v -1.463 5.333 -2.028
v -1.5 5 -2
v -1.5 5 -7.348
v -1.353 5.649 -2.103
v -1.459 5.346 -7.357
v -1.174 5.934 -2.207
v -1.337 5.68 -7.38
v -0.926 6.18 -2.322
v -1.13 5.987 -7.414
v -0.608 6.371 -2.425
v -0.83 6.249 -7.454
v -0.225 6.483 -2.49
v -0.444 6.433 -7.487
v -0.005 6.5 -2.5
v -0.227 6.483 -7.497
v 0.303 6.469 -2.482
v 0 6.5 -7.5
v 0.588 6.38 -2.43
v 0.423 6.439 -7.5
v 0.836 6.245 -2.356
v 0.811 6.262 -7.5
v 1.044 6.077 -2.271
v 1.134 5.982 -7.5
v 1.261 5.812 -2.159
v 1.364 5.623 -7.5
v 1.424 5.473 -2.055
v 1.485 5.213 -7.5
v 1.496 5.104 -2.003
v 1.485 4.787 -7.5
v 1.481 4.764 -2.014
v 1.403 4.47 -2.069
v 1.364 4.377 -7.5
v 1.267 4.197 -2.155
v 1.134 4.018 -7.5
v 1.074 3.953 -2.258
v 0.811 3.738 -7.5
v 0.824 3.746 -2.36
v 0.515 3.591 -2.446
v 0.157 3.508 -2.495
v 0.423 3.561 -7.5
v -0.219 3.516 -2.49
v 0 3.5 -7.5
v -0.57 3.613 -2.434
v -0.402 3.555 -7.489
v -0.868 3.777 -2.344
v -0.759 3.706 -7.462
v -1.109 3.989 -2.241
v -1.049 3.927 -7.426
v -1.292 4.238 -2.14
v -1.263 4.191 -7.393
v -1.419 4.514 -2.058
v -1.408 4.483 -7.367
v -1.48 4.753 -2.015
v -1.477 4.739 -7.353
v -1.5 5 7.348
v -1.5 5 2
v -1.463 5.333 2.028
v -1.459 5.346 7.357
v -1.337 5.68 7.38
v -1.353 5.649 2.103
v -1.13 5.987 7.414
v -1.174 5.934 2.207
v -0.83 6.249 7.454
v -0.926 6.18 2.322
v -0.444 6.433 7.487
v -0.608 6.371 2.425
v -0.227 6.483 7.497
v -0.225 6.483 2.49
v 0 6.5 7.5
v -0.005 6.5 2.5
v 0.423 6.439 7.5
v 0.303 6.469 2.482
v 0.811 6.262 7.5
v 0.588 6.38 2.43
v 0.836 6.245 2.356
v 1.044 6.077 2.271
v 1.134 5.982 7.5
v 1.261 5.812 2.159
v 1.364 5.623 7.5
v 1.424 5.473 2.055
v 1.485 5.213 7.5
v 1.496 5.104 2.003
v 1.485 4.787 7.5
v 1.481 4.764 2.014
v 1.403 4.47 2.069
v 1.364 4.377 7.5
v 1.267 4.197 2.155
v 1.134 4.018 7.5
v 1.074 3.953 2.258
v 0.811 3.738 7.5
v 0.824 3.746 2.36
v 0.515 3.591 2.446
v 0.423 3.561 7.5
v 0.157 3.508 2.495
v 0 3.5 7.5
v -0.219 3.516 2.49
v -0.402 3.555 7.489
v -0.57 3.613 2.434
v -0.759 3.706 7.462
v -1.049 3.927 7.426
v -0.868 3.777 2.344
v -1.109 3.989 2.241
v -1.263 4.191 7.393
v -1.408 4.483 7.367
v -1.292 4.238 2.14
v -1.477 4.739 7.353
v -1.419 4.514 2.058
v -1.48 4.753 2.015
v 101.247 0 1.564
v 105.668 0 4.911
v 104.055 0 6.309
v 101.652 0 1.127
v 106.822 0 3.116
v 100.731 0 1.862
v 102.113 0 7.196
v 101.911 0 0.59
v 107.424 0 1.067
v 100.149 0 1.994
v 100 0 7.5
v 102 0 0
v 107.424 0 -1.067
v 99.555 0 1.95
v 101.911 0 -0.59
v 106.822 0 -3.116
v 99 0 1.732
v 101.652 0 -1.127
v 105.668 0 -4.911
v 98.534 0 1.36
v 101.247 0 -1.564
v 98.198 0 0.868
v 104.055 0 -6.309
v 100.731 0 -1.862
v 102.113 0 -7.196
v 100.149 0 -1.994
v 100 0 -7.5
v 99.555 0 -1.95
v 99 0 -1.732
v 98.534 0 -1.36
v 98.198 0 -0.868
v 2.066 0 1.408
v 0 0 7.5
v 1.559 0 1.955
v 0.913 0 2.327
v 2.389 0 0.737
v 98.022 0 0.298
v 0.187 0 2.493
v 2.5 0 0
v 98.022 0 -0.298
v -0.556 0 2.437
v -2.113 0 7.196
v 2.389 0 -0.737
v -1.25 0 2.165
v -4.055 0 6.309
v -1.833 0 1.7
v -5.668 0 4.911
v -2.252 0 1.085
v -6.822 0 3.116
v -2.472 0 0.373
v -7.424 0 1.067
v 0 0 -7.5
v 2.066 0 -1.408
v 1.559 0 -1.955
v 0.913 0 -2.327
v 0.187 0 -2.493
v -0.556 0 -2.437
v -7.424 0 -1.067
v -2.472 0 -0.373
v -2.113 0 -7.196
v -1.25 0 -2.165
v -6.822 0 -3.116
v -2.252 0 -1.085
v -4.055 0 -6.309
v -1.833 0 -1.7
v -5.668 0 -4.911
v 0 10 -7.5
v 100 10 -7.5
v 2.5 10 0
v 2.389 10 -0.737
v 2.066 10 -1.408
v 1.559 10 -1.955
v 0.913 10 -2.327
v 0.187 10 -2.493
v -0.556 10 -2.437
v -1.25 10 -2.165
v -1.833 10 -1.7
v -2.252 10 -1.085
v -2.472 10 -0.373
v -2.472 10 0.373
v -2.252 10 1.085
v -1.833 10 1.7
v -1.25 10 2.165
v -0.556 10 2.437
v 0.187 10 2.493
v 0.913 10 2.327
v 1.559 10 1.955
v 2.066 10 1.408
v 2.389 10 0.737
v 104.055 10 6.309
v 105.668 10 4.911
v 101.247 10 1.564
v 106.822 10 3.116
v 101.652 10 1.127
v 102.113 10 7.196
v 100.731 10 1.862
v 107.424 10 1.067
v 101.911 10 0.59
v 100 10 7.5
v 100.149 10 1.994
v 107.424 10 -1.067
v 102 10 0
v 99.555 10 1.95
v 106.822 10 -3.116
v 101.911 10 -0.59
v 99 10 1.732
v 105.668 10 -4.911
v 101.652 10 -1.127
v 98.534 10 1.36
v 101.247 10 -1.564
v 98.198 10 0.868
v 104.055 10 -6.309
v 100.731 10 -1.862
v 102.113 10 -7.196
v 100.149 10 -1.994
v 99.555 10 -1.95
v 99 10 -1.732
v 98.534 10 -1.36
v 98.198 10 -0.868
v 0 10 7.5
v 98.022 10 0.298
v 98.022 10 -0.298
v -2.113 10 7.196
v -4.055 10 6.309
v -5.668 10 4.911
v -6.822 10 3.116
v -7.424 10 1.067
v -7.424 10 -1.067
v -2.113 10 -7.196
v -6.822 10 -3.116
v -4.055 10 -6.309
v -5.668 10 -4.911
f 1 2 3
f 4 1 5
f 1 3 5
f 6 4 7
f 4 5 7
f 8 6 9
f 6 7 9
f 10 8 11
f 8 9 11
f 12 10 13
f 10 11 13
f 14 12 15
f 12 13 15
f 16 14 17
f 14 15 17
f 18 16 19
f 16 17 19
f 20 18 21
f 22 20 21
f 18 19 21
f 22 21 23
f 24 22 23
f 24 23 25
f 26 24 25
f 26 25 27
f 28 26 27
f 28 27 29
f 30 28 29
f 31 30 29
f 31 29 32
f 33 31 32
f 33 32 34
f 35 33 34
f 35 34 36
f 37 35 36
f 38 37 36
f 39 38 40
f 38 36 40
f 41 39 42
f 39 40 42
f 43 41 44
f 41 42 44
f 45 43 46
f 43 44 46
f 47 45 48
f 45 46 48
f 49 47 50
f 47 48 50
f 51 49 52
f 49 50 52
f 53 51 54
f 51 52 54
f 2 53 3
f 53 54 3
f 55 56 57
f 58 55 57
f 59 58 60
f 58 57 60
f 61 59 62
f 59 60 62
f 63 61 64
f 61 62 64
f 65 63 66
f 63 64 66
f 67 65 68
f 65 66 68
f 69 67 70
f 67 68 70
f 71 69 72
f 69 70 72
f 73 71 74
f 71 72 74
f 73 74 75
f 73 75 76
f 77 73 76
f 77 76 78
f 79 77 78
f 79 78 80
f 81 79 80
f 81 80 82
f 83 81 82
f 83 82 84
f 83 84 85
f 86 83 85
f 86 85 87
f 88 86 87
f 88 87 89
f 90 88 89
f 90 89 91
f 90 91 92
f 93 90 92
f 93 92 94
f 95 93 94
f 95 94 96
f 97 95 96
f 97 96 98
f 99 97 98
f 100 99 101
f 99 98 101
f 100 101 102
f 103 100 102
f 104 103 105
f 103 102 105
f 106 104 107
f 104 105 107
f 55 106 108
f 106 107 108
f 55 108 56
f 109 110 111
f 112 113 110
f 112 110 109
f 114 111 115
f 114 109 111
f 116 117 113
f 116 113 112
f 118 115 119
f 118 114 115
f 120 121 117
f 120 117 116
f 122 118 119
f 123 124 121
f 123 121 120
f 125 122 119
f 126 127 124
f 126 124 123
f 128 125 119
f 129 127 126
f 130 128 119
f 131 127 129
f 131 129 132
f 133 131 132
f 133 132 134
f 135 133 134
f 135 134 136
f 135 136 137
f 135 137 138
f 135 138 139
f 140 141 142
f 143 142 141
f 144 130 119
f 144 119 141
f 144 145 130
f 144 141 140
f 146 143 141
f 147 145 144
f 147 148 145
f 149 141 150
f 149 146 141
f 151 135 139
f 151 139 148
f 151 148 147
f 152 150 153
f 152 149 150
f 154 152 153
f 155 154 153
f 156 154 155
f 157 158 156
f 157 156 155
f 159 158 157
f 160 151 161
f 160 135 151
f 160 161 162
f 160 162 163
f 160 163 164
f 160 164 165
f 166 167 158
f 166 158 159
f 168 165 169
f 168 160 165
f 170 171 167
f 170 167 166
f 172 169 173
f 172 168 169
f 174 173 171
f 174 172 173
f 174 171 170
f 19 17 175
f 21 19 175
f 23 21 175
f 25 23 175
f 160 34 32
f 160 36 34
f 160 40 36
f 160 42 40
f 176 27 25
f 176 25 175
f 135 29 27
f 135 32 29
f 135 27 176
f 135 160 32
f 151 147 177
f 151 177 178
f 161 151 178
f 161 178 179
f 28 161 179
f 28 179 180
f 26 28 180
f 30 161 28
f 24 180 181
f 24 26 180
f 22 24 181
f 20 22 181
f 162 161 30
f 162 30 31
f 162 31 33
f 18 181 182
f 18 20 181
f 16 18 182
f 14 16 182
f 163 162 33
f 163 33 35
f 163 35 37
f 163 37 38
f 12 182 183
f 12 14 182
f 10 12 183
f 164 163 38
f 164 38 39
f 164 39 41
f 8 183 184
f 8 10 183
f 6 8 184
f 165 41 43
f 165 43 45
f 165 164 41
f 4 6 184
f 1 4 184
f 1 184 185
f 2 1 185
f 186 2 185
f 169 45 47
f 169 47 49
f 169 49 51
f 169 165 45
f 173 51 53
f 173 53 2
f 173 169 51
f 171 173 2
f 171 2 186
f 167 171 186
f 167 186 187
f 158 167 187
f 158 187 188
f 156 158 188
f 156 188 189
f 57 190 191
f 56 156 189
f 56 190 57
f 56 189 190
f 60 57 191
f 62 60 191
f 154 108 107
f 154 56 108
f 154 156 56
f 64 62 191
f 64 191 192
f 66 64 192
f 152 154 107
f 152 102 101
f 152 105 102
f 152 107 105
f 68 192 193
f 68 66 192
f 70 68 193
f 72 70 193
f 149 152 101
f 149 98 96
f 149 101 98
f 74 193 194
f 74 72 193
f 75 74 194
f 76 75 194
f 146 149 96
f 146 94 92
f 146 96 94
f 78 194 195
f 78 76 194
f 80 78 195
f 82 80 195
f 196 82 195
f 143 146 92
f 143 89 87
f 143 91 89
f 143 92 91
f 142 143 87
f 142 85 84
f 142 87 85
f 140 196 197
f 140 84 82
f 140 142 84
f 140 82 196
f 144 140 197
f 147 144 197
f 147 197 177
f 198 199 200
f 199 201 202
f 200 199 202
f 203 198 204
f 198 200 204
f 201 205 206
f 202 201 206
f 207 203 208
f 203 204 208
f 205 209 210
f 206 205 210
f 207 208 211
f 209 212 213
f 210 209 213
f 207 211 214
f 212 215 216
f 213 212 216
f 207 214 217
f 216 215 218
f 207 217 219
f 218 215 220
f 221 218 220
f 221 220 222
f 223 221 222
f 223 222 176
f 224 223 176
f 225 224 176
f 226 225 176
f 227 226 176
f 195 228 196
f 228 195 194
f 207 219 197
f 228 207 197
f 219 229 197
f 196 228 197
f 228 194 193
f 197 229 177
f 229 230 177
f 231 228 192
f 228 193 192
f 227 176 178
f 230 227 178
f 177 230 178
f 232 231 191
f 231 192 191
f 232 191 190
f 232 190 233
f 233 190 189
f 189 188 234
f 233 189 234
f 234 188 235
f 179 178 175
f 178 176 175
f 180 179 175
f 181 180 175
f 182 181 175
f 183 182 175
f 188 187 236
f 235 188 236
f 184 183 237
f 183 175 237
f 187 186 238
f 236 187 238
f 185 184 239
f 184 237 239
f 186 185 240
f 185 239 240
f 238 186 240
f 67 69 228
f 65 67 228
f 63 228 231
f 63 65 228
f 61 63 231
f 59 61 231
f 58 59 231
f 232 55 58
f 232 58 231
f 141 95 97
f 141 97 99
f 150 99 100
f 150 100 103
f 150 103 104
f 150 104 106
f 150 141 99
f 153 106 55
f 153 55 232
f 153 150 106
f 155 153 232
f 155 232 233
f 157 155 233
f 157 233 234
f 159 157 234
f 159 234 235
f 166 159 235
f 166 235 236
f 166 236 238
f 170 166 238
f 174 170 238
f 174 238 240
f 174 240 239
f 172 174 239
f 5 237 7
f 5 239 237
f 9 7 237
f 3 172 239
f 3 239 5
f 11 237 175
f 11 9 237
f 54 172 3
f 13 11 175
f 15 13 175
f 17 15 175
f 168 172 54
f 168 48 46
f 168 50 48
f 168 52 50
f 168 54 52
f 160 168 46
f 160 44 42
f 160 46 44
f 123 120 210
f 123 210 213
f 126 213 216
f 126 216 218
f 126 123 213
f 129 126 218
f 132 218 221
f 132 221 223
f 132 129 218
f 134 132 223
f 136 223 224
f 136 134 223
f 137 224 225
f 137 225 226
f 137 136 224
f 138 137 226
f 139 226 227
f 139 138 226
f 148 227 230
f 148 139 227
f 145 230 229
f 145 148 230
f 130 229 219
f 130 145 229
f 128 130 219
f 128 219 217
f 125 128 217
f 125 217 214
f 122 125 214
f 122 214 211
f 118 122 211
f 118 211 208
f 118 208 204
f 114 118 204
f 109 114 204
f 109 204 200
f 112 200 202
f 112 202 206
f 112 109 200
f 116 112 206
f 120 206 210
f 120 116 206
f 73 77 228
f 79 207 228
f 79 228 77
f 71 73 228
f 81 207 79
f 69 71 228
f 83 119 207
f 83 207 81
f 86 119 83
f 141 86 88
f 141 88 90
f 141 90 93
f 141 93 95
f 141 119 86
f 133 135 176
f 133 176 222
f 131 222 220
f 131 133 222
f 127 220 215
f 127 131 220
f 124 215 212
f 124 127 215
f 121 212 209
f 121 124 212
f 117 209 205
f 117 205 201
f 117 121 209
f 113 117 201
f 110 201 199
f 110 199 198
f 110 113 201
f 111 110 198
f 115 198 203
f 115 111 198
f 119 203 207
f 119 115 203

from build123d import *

# Parameters (mm, degrees)
SKETCH2_R           = 2.5
SKETCH2_R_2         = 2
BOSS_EXTRUDE1_DEPTH = 10
SKETCH4_R           = 1.5
CUT_EXTRUDE3_DEPTH  = 16


with BuildPart() as part:
    # Sketch2 → Boss-Extrude1 (new body)
    with BuildSketch(Plane(origin=(0, 0, 0), x_dir=(1, 0, 0), z_dir=(0, 1, 0))):
        with BuildLine():
            Line((0, 7.5), (100, 7.5))
            ThreePointArc((100, 7.5), (107.5, 0), (100, -7.5))
            Line((100, -7.5), (0, -7.5))
            ThreePointArc((0, -7.5), (-7.5, 0), (0, 7.5))
        make_face()
        Circle(SKETCH2_R, mode=Mode.SUBTRACT)
        with Locations((100, 0)):
            Circle(SKETCH2_R_2, mode=Mode.SUBTRACT)
    extrude(amount=BOSS_EXTRUDE1_DEPTH)

    # Sketch4 → Cut-Extrude3 (cut, through all)
    with BuildSketch(Plane(origin=(0, 0, -7.5), x_dir=(-1, 0, 0), z_dir=(0, 0, -1))):
        with Locations((0, 5)):
            Circle(SKETCH4_R)
    extrude(amount=-CUT_EXTRUDE3_DEPTH, mode=Mode.SUBTRACT)


solid = part.part
